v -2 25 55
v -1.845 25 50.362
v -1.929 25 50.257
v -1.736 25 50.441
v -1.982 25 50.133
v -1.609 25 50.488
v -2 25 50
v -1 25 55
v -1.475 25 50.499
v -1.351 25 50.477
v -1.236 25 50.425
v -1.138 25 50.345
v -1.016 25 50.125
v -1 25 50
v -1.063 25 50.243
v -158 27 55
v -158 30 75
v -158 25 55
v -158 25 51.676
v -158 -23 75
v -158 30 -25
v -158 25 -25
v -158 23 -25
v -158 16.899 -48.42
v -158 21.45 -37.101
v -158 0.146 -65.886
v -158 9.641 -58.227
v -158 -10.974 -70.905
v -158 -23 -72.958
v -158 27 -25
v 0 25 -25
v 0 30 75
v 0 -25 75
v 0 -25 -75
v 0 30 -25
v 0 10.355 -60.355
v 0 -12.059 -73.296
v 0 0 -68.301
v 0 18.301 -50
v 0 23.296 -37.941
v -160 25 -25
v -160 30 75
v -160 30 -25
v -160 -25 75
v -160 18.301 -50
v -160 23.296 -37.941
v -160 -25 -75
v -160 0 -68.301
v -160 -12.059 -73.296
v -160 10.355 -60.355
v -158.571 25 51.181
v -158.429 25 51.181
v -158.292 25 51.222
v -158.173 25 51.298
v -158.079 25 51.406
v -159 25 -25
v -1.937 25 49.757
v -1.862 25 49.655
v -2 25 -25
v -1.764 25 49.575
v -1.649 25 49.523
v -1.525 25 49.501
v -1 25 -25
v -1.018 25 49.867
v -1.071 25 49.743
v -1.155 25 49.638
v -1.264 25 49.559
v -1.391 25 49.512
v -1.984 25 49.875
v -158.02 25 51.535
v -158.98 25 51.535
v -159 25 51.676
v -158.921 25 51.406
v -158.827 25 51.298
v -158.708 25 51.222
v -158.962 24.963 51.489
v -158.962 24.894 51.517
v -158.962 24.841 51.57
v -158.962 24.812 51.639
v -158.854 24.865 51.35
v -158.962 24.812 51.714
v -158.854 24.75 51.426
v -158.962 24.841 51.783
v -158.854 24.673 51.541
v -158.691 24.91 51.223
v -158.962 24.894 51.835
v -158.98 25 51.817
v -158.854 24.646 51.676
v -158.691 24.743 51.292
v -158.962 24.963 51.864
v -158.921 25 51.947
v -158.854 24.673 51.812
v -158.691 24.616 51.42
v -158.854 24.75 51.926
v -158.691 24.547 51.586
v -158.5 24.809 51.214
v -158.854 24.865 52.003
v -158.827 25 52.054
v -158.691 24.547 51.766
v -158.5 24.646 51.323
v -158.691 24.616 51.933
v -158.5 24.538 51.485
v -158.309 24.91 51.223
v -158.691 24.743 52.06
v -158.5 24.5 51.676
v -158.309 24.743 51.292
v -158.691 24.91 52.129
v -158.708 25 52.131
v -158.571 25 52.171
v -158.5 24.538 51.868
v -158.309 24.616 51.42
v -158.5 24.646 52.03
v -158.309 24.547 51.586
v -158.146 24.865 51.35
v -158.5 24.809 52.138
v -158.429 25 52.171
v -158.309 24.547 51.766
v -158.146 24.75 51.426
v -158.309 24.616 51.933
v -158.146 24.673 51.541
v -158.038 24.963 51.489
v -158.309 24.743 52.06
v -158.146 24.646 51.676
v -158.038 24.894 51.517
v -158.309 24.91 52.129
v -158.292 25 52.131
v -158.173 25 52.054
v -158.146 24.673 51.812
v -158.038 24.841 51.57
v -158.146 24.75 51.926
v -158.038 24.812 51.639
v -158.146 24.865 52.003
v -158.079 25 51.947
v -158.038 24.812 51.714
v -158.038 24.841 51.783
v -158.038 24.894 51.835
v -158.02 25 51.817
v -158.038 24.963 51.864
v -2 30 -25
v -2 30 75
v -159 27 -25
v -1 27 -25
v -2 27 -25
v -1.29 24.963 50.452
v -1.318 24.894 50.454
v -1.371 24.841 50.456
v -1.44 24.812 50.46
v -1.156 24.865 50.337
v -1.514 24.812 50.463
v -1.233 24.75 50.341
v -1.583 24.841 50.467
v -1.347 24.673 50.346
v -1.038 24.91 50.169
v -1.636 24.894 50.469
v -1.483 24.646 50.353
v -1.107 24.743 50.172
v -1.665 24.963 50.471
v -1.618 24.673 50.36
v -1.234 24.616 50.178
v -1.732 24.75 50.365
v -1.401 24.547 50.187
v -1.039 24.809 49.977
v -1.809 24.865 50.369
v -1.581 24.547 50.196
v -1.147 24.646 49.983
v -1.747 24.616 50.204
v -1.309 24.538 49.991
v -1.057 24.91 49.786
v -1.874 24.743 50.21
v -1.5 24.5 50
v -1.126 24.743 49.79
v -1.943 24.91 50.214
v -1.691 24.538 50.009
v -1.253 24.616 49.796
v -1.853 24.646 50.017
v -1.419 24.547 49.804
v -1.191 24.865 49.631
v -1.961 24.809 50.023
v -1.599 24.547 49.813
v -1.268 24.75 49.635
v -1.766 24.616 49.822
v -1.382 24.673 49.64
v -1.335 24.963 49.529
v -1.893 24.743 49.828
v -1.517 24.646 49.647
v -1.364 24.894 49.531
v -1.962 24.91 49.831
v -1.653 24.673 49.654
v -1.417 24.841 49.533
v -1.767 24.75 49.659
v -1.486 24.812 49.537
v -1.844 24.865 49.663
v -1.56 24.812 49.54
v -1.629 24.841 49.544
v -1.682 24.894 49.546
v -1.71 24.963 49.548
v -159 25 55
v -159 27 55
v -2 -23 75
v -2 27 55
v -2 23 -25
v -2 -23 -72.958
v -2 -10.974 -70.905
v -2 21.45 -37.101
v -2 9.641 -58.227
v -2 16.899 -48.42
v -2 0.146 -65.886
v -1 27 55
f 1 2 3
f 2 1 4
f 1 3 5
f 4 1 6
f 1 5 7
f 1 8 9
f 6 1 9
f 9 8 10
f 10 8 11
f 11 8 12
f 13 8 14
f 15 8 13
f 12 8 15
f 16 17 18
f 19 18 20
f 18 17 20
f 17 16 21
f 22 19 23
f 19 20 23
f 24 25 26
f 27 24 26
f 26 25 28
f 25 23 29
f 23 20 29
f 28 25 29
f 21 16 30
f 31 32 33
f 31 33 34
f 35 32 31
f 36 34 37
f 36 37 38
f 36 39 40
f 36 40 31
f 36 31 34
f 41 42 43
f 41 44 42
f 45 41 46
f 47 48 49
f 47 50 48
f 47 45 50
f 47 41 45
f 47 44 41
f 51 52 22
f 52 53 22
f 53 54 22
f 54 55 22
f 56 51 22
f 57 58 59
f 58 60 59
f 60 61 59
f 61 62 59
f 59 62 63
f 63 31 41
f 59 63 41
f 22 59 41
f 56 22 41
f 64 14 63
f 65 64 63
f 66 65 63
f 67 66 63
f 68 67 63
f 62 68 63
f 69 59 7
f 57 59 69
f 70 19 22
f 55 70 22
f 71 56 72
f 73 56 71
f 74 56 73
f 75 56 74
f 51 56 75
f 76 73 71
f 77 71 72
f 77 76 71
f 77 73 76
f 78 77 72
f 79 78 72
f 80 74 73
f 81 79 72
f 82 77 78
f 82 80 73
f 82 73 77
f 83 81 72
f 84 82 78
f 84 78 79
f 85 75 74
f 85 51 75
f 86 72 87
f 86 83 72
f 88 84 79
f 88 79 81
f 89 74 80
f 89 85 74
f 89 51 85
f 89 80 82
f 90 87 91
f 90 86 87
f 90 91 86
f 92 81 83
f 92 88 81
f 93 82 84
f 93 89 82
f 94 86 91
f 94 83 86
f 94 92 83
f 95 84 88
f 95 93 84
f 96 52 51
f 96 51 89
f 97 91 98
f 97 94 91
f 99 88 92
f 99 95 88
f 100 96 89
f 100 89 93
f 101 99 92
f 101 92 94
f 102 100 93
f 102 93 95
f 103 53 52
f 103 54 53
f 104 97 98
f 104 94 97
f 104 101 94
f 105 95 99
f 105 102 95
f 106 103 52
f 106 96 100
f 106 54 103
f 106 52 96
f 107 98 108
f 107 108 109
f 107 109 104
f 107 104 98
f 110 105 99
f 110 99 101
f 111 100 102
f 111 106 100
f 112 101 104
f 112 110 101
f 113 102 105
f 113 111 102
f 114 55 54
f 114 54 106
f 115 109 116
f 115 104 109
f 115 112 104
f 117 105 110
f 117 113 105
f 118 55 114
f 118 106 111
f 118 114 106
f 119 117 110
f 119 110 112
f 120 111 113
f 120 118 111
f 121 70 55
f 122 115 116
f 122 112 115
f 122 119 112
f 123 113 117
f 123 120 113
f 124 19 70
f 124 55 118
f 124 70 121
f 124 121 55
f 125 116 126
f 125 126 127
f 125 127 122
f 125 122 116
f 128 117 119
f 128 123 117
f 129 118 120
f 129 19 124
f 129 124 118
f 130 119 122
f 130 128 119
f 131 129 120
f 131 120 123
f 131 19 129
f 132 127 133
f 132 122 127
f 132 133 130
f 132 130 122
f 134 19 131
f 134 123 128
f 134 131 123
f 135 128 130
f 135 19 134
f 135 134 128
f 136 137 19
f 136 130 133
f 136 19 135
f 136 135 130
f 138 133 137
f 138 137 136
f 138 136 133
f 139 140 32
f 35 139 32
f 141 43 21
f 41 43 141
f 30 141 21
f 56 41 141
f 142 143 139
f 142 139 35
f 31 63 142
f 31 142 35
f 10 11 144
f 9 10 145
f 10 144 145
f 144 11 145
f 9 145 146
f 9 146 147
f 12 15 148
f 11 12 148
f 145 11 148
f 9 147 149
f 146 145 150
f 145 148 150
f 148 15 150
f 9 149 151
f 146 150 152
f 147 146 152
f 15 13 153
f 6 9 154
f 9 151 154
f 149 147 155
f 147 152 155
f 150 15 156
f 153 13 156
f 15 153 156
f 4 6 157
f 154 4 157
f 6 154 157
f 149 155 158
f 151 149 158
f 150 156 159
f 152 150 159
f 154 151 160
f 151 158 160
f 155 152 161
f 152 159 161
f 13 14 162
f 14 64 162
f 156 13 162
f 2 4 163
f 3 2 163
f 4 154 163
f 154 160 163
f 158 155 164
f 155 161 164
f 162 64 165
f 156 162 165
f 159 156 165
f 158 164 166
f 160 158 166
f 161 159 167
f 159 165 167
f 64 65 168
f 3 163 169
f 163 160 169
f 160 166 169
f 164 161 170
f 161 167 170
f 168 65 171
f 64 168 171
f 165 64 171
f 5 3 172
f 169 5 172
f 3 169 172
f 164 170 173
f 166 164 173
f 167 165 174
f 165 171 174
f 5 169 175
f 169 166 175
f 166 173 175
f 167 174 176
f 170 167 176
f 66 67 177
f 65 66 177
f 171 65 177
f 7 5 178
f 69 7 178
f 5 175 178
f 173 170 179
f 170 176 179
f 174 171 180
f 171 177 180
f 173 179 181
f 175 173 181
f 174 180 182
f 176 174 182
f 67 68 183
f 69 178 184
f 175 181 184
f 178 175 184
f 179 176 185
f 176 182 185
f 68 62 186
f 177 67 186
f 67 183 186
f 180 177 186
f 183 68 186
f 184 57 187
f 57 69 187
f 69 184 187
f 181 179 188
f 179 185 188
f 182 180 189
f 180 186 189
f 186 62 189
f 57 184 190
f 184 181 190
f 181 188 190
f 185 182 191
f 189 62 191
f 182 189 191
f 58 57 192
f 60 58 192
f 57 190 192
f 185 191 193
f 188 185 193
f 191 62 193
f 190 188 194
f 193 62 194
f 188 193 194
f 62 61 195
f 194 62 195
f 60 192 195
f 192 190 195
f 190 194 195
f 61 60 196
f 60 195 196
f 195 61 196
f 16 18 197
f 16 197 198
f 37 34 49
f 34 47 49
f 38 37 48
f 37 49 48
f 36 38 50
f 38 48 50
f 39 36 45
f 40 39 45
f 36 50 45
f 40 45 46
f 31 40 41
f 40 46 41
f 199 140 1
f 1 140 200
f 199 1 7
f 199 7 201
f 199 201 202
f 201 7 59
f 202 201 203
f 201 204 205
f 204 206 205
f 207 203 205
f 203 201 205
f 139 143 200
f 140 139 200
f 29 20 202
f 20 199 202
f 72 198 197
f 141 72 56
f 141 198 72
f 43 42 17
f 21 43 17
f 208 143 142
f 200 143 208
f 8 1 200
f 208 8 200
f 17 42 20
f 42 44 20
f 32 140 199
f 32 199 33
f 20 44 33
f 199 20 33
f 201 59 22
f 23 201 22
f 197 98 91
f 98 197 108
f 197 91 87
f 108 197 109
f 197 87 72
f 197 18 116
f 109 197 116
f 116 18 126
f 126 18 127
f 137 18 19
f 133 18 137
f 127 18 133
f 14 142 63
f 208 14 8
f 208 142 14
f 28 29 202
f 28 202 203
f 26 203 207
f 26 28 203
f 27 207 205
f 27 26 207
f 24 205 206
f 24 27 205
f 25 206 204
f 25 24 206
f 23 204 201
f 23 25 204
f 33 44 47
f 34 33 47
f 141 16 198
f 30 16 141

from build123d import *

# Parameters (mm, degrees)
SKETCH1_W           = 150
SKETCH1_H           = 50
BOSS_EXTRUDE1_DEPTH = 160
FILLET2_R           = 50
SHELL1_T            = -2
CUT_EXTRUDE1_DEPTH  = 2
SKETCH20_W          = 2
SKETCH20_H          = 100
BOSS_EXTRUDE2_DEPTH = 5
SKETCH21_W          = 80
SKETCH21_H          = 2
CUT_EXTRUDE2_DEPTH  = 1
SKETCH22_W          = 80
SKETCH22_H          = 2
CUT_EXTRUDE3_DEPTH  = 1


with BuildPart() as part:
    # Sketch1 → Boss-Extrude1 (new body)
    with BuildSketch(Plane(origin=(0, 0, 0), x_dir=(0, 0, -1), z_dir=(1, 0, 0))):
        Rectangle(SKETCH1_W, SKETCH1_H)
    extrude(amount=-BOSS_EXTRUDE1_DEPTH)

    # Fillet2
    fillet2_edges = [part.edges().sort_by_distance(p)[0] for p in [
        (-80, 25, -75),
    ]]
    fillet(fillet2_edges, radius=FILLET2_R - 0.0001)  # a hair under: the kernel refuses the full size

    # Shell1
    shell1_openings = [part.faces().sort_by_distance(p)[0] for p in [
        (-80, 0, 75),
    ]]
    offset(amount=SHELL1_T, openings=shell1_openings, kind=Kind.INTERSECTION)

    # Sketch17 → Cut-Extrude1 (cut)
    with BuildSketch(Plane(origin=(0, 25, 0), x_dir=(1, 0, 0), z_dir=(0, 1, 0))):
        Polygon((-80, 25), (-158, 25), (-158, -75), (-2, -75), (-2, 25), align=None)
    extrude(amount=-CUT_EXTRUDE1_DEPTH, mode=Mode.SUBTRACT)

    # Sketch20 → Boss-Extrude2 (add)
    with BuildSketch(Plane(origin=(0, 25, 0), x_dir=(1, 0, 0), z_dir=(0, 1, 0))):
        with Locations((-159, -25)):
            Rectangle(SKETCH20_W, SKETCH20_H)
        with Locations((-1, -25)):
            Rectangle(SKETCH20_W, SKETCH20_H)
    extrude(amount=BOSS_EXTRUDE2_DEPTH)

    # Sketch21 → Cut-Extrude2 (cut)
    with BuildSketch(Plane(origin=(-158, 0, 0), x_dir=(0, 0, -1), z_dir=(1, 0, 0))):
        with Locations((-15, 26)):
            Rectangle(SKETCH21_W, SKETCH21_H)
    extrude(amount=-CUT_EXTRUDE2_DEPTH, mode=Mode.SUBTRACT)

    # Sketch22 → Cut-Extrude3 (cut)
    with BuildSketch(Plane.ZY.offset(2)):
        with Locations((15, 26)):
            Rectangle(SKETCH22_W, SKETCH22_H)
    extrude(amount=-CUT_EXTRUDE3_DEPTH, mode=Mode.SUBTRACT)

    # Sketch25 → Cut-Revolve1 (revolve, cut)
    with BuildSketch(Plane(origin=(0, 25, 0), x_dir=(1, 0, 0), z_dir=(0, 1, 0))):
        with BuildLine():
            ThreePointArc((-1.475259699, -50.499387542), (-1.999387542, -50.024740301), (-1.524740301, -49.500612458))
            Line((-1.524740301, -49.500612458), (-1.5, -50))
            Line((-1.5, -50), (-1.475259699, -50.499387542))
        make_face()
    revolve(axis=Axis((-1.5, 25, 50), (-0.049480602249094376, 0, -0.9987750847919)), mode=Mode.SUBTRACT)

    # Sketch26 → Cut-Revolve2 (revolve, cut)
    with BuildSketch(Plane(origin=(0, 25, 0), x_dir=(1, 0, 0), z_dir=(0, 1, 0))):
        with BuildLine():
            Line((-158, -51.676352911), (-159, -51.676352911))
            ThreePointArc((-159, -51.676352911), (-158.5, -52.176352911), (-158, -51.676352911))
        make_face()
    revolve(axis=Axis((-158, 25, 51.676352911), (-1, 0, 0)), mode=Mode.SUBTRACT)


solid = part.part
